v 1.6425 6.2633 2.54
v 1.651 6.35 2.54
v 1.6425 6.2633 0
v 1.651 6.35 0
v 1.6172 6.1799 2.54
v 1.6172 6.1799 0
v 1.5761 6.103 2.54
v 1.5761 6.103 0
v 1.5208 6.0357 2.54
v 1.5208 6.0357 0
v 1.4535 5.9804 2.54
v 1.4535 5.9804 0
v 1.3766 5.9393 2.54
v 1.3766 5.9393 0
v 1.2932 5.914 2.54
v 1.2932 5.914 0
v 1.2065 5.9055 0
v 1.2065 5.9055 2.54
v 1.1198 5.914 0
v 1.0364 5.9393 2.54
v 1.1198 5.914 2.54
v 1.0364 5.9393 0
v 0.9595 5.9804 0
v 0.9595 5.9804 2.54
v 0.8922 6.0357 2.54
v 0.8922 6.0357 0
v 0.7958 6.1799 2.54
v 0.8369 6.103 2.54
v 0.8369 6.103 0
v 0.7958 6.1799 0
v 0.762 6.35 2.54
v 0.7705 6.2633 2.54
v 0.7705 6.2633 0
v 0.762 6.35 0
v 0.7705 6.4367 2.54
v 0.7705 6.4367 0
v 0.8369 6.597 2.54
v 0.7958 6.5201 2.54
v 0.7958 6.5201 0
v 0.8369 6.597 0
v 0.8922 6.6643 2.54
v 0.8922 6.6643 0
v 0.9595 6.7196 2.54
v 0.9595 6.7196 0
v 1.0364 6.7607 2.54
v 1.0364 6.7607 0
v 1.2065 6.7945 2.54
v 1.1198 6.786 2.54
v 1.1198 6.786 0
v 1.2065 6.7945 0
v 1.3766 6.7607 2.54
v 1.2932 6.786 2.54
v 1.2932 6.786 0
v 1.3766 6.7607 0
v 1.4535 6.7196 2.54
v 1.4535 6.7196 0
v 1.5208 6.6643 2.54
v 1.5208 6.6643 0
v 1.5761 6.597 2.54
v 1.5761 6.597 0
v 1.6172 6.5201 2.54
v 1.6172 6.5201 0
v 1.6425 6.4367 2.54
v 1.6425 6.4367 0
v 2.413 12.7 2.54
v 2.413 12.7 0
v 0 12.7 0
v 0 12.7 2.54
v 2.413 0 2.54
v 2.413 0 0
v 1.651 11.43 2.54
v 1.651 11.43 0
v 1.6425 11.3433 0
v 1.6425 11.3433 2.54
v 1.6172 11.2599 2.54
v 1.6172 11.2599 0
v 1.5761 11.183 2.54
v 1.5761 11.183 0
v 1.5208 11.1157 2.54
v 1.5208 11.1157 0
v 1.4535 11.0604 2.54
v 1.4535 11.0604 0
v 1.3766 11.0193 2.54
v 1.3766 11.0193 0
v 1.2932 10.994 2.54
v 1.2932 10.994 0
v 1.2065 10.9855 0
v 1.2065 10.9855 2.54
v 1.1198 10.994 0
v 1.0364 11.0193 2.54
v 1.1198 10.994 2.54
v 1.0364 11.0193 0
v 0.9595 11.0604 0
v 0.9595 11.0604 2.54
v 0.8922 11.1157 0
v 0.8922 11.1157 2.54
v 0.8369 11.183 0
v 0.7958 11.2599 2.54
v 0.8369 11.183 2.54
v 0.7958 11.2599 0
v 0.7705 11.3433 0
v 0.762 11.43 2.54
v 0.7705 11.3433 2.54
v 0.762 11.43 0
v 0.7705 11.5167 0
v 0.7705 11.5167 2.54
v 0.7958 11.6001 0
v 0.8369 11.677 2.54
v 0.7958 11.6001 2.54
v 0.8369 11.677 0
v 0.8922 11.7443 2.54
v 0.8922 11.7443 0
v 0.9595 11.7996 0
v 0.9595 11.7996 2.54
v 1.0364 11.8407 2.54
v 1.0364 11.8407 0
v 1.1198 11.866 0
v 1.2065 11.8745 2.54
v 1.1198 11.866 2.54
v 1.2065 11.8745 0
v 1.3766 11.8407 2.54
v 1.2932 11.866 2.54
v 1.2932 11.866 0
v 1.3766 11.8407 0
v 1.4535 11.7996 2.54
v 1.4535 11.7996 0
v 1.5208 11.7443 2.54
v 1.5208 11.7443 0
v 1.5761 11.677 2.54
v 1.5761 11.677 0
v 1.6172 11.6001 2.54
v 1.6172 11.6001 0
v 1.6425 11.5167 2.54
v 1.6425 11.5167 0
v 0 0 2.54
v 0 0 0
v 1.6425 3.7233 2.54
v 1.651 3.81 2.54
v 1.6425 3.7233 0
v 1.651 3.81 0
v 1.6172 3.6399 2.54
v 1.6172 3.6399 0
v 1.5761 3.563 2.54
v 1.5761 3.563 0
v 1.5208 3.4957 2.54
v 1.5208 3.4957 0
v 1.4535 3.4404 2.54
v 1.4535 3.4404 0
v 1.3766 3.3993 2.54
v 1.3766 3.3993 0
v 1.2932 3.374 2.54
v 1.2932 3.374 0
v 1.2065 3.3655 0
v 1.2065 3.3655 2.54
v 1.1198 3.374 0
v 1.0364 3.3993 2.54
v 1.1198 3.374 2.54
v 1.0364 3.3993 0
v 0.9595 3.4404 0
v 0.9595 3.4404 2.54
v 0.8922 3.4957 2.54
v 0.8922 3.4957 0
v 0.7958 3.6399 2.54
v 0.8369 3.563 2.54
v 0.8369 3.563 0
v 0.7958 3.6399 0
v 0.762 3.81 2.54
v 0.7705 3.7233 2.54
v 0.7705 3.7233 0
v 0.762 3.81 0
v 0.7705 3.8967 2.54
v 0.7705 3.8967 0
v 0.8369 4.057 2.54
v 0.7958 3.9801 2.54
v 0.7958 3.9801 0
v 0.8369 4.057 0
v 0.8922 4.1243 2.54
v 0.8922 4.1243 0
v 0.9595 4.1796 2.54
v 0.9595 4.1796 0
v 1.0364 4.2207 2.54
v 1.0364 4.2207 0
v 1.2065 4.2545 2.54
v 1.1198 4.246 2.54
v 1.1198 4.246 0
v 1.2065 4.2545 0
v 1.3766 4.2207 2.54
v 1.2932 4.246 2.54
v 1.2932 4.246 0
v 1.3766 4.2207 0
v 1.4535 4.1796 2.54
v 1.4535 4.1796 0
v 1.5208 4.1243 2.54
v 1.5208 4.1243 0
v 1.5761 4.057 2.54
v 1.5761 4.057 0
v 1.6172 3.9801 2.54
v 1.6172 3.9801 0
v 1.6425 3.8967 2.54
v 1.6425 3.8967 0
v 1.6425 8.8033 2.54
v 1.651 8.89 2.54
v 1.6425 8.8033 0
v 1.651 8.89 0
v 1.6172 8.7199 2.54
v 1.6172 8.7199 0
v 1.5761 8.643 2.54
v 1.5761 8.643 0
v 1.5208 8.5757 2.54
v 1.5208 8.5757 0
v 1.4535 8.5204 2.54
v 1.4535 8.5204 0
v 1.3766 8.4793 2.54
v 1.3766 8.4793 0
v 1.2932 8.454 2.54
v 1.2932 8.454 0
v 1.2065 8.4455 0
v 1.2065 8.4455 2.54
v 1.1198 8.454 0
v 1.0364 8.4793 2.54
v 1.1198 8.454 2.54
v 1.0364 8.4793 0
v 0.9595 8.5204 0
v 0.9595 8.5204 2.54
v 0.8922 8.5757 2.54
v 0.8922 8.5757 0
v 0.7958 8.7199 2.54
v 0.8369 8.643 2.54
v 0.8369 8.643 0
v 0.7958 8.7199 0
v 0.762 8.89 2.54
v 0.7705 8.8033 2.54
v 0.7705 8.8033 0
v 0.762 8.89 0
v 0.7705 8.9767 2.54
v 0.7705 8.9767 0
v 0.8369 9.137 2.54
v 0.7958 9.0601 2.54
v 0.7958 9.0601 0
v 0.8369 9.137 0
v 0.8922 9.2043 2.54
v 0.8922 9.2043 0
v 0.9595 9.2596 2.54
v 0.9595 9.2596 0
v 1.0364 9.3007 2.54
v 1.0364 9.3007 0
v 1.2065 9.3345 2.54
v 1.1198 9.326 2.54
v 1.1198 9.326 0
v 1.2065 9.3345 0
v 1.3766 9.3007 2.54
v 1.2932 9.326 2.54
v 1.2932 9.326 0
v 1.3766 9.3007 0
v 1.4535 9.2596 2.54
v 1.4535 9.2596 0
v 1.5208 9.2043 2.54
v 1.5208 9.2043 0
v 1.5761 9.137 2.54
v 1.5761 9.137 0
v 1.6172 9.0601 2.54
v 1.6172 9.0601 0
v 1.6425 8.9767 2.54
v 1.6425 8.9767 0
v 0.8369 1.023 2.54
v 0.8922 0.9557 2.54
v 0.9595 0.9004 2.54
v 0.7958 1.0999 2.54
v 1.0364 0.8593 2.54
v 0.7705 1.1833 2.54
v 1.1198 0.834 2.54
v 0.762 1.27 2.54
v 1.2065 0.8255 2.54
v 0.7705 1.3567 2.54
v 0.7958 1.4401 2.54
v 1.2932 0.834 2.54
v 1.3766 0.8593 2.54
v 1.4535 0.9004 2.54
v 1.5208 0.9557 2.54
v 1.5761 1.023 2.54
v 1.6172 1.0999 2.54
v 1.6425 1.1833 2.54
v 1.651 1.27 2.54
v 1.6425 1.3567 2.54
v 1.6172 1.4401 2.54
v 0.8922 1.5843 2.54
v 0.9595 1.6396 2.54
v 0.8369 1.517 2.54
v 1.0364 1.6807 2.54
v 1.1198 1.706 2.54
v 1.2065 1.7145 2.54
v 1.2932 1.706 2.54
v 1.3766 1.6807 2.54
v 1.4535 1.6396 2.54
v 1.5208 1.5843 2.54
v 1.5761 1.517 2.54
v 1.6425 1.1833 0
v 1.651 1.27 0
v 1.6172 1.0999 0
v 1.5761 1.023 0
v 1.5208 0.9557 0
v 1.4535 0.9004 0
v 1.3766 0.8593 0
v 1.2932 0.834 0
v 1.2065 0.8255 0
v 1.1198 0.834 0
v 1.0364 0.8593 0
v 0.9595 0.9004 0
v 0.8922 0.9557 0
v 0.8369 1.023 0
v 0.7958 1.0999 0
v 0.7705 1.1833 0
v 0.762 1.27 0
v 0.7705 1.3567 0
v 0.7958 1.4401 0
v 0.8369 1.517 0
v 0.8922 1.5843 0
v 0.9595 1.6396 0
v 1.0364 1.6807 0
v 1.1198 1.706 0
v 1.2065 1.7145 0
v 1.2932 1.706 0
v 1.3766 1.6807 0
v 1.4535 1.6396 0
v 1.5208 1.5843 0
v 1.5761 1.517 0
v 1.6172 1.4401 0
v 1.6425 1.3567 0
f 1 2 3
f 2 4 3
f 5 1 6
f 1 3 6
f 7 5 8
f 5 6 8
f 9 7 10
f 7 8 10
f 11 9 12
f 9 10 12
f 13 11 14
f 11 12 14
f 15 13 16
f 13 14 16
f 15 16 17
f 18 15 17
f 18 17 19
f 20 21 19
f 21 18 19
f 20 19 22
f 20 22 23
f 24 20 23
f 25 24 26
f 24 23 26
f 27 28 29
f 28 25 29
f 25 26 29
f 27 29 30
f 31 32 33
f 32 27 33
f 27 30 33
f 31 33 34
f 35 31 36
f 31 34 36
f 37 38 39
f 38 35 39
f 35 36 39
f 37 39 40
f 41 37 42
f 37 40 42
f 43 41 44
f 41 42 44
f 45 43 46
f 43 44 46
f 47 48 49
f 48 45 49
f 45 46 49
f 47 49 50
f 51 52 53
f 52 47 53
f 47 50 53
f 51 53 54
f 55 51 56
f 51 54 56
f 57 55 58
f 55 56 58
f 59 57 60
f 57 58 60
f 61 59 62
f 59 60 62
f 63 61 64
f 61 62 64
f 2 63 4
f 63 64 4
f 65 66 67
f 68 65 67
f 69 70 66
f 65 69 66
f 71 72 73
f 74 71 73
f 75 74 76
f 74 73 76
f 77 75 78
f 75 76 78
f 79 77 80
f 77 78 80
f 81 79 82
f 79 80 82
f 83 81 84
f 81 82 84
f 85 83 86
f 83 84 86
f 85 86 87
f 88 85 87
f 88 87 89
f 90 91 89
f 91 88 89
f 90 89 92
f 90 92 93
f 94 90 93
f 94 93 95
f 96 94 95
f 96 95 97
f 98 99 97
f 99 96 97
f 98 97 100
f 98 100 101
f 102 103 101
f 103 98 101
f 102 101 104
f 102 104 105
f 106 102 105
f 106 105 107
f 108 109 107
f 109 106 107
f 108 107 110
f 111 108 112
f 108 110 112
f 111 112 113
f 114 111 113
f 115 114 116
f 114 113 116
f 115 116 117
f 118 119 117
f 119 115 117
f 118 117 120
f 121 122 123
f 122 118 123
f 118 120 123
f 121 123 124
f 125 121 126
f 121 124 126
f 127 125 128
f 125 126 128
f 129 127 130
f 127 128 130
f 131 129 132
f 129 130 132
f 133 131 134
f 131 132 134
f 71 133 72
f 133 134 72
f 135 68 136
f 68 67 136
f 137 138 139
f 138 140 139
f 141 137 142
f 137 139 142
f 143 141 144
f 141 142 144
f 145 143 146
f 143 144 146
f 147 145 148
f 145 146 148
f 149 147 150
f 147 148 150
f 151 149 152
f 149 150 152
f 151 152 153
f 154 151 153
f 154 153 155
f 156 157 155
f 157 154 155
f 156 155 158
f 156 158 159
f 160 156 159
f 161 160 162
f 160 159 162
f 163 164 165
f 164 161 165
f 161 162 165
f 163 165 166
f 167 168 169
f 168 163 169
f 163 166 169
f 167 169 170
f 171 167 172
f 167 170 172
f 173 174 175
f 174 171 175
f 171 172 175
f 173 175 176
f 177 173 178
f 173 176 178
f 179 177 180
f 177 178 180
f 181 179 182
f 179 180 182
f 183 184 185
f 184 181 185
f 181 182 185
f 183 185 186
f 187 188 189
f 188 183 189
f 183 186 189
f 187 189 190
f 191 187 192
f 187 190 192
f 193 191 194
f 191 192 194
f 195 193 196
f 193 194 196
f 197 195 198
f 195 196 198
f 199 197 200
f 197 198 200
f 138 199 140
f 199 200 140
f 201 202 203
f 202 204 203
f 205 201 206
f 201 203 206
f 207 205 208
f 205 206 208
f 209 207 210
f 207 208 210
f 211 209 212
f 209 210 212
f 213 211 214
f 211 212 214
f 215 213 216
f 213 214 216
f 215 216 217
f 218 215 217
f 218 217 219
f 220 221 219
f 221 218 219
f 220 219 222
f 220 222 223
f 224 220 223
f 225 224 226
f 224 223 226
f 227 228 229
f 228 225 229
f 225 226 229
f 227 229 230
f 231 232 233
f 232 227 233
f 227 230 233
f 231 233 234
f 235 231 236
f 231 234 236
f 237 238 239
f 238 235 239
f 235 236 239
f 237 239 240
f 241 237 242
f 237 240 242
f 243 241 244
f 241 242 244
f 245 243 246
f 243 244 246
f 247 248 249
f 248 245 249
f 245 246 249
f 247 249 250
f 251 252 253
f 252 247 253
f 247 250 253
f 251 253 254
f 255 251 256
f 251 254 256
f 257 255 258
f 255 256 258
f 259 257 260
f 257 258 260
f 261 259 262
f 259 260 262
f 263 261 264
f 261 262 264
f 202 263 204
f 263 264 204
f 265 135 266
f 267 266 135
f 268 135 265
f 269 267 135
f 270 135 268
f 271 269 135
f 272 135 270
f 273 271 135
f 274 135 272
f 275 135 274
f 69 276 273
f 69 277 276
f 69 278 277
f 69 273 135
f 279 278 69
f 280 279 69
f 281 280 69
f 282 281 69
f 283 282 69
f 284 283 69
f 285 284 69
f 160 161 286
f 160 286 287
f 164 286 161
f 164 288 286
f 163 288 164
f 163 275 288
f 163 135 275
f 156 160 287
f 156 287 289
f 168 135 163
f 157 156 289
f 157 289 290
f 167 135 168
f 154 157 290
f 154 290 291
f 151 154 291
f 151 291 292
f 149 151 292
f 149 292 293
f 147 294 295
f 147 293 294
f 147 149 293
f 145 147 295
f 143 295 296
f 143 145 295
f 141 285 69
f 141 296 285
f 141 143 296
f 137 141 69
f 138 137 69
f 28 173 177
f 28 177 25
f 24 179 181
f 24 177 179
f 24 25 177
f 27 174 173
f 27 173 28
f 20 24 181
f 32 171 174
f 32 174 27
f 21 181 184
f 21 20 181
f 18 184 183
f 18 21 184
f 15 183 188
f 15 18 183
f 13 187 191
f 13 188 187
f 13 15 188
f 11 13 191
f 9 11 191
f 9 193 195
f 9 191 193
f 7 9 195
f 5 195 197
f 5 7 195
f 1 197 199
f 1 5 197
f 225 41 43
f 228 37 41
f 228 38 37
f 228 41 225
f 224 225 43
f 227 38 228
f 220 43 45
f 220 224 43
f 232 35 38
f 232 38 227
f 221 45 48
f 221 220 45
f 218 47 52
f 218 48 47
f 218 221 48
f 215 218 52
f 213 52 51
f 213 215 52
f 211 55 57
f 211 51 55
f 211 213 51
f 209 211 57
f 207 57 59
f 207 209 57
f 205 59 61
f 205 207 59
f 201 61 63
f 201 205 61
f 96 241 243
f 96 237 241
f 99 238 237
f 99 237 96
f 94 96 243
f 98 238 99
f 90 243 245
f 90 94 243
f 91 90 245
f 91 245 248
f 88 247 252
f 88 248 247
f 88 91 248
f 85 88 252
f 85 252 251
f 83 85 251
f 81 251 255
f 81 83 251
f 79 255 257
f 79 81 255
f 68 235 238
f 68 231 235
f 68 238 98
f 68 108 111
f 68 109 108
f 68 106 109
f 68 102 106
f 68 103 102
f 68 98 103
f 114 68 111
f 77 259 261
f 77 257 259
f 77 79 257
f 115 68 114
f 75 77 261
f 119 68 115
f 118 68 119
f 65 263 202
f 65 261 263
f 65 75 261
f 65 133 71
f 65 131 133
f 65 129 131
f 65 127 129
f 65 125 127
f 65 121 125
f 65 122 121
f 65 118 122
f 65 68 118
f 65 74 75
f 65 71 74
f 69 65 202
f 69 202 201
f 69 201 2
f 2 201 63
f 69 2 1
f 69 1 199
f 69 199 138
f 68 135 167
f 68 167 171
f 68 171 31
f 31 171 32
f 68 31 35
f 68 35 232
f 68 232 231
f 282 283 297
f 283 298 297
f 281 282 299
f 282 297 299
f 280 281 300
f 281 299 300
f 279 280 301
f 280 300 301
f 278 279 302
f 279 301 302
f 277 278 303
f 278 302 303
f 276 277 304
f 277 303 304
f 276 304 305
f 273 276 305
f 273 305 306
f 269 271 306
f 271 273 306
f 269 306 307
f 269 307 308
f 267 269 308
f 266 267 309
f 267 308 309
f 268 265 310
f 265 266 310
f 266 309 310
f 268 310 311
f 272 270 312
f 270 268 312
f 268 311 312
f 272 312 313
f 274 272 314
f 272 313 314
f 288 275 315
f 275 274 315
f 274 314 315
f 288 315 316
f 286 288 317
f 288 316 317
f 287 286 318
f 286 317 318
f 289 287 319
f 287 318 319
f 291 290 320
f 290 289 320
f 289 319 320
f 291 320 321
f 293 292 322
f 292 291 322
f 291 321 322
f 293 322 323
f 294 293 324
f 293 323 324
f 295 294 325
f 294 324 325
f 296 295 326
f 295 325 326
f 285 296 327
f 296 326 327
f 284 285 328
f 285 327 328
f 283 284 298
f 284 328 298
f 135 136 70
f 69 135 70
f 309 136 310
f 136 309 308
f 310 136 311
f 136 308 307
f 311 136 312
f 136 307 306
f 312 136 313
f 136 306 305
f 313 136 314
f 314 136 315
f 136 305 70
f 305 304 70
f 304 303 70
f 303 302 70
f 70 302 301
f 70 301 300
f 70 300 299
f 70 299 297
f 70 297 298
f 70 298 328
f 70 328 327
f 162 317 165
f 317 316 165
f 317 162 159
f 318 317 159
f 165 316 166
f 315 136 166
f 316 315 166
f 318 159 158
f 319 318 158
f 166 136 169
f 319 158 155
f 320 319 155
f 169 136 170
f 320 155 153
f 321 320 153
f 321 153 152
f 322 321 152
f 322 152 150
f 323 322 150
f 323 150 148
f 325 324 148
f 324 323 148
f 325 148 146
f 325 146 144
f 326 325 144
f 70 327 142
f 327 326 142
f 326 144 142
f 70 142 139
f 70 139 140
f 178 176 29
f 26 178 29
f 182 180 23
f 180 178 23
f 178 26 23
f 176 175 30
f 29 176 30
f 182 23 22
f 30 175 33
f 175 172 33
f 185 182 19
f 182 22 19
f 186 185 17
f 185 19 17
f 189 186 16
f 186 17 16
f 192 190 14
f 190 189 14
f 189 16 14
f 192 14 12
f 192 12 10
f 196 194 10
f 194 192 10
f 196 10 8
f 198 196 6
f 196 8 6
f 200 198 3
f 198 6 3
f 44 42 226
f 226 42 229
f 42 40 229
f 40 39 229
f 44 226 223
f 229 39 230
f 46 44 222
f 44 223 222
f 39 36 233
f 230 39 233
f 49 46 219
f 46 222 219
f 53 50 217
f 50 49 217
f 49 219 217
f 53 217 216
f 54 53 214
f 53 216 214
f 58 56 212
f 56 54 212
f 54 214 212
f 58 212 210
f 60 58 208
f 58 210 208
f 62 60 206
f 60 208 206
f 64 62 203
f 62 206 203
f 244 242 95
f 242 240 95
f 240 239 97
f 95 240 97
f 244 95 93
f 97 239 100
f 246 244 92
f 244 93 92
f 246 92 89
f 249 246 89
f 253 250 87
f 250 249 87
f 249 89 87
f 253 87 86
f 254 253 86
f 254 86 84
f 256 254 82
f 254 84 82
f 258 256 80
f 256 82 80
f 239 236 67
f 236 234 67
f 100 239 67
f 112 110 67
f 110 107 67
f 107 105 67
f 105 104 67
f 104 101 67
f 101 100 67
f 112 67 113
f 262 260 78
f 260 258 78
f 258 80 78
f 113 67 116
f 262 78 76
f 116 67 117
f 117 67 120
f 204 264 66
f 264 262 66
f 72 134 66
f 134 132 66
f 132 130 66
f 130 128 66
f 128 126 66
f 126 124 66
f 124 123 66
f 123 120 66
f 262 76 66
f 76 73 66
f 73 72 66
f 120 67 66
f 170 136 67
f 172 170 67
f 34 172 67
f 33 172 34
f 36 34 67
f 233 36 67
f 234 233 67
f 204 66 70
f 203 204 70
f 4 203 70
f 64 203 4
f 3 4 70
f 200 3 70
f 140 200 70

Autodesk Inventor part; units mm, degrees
ref_plane "YZ Plane" through (0, 0, 0) normal (1, 0, 0) x (0, 1, 0)
ref_plane "XZ Plane" through (0, 0, 0) normal (0, 1, 0) x (-1, 0, 0)
ref_plane "XY Plane" through (0, 0, 0) normal (0, 0, 1) x (1, 0, 0)
sketch "Sketch1" plane through (0, 0, 0) normal (0, 0, 1) x (1, 0, 0)
  line L0 (0, 0) -> (2.413, 0)
  line L1 (2.413, 0) -> (2.413, 12.7)
  line L2 (2.413, 12.7) -> (0, 12.7)
  line L3 (0, 12.7) -> (0, 0)
  circle A0 centre (1.2065, 11.43) radius 0.4445
  circle A1 centre (1.2065, 8.89) radius 0.4445
  circle A2 centre (1.2065, 6.35) radius 0.4445
  circle A3 centre (1.2065, 3.81) radius 0.4445
  circle A4 centre (1.2065, 1.27) radius 0.4445
  dimension "d0" = 2.413
  dimension "d1" = 12.7
  dimension "d2" = 0.889
  dimension "d3" = 0.889
  dimension "d4" = 0.889
  dimension "d5" = 1.27
  dimension "d6" = 2.54
  dimension "d7" = 2.54
  dimension "d8" = 0.889
  dimension "d9" = 0.889
  dimension "d10" = 2.54
  dimension "d11" = 2.54
  dimension "d12" = 1.2065
extrude "Extrusion1" add sketch "Sketch1" along normal blind 2.54
equation "\"d12\" = 0.5 * d0"
properties part number "5 pin header"
